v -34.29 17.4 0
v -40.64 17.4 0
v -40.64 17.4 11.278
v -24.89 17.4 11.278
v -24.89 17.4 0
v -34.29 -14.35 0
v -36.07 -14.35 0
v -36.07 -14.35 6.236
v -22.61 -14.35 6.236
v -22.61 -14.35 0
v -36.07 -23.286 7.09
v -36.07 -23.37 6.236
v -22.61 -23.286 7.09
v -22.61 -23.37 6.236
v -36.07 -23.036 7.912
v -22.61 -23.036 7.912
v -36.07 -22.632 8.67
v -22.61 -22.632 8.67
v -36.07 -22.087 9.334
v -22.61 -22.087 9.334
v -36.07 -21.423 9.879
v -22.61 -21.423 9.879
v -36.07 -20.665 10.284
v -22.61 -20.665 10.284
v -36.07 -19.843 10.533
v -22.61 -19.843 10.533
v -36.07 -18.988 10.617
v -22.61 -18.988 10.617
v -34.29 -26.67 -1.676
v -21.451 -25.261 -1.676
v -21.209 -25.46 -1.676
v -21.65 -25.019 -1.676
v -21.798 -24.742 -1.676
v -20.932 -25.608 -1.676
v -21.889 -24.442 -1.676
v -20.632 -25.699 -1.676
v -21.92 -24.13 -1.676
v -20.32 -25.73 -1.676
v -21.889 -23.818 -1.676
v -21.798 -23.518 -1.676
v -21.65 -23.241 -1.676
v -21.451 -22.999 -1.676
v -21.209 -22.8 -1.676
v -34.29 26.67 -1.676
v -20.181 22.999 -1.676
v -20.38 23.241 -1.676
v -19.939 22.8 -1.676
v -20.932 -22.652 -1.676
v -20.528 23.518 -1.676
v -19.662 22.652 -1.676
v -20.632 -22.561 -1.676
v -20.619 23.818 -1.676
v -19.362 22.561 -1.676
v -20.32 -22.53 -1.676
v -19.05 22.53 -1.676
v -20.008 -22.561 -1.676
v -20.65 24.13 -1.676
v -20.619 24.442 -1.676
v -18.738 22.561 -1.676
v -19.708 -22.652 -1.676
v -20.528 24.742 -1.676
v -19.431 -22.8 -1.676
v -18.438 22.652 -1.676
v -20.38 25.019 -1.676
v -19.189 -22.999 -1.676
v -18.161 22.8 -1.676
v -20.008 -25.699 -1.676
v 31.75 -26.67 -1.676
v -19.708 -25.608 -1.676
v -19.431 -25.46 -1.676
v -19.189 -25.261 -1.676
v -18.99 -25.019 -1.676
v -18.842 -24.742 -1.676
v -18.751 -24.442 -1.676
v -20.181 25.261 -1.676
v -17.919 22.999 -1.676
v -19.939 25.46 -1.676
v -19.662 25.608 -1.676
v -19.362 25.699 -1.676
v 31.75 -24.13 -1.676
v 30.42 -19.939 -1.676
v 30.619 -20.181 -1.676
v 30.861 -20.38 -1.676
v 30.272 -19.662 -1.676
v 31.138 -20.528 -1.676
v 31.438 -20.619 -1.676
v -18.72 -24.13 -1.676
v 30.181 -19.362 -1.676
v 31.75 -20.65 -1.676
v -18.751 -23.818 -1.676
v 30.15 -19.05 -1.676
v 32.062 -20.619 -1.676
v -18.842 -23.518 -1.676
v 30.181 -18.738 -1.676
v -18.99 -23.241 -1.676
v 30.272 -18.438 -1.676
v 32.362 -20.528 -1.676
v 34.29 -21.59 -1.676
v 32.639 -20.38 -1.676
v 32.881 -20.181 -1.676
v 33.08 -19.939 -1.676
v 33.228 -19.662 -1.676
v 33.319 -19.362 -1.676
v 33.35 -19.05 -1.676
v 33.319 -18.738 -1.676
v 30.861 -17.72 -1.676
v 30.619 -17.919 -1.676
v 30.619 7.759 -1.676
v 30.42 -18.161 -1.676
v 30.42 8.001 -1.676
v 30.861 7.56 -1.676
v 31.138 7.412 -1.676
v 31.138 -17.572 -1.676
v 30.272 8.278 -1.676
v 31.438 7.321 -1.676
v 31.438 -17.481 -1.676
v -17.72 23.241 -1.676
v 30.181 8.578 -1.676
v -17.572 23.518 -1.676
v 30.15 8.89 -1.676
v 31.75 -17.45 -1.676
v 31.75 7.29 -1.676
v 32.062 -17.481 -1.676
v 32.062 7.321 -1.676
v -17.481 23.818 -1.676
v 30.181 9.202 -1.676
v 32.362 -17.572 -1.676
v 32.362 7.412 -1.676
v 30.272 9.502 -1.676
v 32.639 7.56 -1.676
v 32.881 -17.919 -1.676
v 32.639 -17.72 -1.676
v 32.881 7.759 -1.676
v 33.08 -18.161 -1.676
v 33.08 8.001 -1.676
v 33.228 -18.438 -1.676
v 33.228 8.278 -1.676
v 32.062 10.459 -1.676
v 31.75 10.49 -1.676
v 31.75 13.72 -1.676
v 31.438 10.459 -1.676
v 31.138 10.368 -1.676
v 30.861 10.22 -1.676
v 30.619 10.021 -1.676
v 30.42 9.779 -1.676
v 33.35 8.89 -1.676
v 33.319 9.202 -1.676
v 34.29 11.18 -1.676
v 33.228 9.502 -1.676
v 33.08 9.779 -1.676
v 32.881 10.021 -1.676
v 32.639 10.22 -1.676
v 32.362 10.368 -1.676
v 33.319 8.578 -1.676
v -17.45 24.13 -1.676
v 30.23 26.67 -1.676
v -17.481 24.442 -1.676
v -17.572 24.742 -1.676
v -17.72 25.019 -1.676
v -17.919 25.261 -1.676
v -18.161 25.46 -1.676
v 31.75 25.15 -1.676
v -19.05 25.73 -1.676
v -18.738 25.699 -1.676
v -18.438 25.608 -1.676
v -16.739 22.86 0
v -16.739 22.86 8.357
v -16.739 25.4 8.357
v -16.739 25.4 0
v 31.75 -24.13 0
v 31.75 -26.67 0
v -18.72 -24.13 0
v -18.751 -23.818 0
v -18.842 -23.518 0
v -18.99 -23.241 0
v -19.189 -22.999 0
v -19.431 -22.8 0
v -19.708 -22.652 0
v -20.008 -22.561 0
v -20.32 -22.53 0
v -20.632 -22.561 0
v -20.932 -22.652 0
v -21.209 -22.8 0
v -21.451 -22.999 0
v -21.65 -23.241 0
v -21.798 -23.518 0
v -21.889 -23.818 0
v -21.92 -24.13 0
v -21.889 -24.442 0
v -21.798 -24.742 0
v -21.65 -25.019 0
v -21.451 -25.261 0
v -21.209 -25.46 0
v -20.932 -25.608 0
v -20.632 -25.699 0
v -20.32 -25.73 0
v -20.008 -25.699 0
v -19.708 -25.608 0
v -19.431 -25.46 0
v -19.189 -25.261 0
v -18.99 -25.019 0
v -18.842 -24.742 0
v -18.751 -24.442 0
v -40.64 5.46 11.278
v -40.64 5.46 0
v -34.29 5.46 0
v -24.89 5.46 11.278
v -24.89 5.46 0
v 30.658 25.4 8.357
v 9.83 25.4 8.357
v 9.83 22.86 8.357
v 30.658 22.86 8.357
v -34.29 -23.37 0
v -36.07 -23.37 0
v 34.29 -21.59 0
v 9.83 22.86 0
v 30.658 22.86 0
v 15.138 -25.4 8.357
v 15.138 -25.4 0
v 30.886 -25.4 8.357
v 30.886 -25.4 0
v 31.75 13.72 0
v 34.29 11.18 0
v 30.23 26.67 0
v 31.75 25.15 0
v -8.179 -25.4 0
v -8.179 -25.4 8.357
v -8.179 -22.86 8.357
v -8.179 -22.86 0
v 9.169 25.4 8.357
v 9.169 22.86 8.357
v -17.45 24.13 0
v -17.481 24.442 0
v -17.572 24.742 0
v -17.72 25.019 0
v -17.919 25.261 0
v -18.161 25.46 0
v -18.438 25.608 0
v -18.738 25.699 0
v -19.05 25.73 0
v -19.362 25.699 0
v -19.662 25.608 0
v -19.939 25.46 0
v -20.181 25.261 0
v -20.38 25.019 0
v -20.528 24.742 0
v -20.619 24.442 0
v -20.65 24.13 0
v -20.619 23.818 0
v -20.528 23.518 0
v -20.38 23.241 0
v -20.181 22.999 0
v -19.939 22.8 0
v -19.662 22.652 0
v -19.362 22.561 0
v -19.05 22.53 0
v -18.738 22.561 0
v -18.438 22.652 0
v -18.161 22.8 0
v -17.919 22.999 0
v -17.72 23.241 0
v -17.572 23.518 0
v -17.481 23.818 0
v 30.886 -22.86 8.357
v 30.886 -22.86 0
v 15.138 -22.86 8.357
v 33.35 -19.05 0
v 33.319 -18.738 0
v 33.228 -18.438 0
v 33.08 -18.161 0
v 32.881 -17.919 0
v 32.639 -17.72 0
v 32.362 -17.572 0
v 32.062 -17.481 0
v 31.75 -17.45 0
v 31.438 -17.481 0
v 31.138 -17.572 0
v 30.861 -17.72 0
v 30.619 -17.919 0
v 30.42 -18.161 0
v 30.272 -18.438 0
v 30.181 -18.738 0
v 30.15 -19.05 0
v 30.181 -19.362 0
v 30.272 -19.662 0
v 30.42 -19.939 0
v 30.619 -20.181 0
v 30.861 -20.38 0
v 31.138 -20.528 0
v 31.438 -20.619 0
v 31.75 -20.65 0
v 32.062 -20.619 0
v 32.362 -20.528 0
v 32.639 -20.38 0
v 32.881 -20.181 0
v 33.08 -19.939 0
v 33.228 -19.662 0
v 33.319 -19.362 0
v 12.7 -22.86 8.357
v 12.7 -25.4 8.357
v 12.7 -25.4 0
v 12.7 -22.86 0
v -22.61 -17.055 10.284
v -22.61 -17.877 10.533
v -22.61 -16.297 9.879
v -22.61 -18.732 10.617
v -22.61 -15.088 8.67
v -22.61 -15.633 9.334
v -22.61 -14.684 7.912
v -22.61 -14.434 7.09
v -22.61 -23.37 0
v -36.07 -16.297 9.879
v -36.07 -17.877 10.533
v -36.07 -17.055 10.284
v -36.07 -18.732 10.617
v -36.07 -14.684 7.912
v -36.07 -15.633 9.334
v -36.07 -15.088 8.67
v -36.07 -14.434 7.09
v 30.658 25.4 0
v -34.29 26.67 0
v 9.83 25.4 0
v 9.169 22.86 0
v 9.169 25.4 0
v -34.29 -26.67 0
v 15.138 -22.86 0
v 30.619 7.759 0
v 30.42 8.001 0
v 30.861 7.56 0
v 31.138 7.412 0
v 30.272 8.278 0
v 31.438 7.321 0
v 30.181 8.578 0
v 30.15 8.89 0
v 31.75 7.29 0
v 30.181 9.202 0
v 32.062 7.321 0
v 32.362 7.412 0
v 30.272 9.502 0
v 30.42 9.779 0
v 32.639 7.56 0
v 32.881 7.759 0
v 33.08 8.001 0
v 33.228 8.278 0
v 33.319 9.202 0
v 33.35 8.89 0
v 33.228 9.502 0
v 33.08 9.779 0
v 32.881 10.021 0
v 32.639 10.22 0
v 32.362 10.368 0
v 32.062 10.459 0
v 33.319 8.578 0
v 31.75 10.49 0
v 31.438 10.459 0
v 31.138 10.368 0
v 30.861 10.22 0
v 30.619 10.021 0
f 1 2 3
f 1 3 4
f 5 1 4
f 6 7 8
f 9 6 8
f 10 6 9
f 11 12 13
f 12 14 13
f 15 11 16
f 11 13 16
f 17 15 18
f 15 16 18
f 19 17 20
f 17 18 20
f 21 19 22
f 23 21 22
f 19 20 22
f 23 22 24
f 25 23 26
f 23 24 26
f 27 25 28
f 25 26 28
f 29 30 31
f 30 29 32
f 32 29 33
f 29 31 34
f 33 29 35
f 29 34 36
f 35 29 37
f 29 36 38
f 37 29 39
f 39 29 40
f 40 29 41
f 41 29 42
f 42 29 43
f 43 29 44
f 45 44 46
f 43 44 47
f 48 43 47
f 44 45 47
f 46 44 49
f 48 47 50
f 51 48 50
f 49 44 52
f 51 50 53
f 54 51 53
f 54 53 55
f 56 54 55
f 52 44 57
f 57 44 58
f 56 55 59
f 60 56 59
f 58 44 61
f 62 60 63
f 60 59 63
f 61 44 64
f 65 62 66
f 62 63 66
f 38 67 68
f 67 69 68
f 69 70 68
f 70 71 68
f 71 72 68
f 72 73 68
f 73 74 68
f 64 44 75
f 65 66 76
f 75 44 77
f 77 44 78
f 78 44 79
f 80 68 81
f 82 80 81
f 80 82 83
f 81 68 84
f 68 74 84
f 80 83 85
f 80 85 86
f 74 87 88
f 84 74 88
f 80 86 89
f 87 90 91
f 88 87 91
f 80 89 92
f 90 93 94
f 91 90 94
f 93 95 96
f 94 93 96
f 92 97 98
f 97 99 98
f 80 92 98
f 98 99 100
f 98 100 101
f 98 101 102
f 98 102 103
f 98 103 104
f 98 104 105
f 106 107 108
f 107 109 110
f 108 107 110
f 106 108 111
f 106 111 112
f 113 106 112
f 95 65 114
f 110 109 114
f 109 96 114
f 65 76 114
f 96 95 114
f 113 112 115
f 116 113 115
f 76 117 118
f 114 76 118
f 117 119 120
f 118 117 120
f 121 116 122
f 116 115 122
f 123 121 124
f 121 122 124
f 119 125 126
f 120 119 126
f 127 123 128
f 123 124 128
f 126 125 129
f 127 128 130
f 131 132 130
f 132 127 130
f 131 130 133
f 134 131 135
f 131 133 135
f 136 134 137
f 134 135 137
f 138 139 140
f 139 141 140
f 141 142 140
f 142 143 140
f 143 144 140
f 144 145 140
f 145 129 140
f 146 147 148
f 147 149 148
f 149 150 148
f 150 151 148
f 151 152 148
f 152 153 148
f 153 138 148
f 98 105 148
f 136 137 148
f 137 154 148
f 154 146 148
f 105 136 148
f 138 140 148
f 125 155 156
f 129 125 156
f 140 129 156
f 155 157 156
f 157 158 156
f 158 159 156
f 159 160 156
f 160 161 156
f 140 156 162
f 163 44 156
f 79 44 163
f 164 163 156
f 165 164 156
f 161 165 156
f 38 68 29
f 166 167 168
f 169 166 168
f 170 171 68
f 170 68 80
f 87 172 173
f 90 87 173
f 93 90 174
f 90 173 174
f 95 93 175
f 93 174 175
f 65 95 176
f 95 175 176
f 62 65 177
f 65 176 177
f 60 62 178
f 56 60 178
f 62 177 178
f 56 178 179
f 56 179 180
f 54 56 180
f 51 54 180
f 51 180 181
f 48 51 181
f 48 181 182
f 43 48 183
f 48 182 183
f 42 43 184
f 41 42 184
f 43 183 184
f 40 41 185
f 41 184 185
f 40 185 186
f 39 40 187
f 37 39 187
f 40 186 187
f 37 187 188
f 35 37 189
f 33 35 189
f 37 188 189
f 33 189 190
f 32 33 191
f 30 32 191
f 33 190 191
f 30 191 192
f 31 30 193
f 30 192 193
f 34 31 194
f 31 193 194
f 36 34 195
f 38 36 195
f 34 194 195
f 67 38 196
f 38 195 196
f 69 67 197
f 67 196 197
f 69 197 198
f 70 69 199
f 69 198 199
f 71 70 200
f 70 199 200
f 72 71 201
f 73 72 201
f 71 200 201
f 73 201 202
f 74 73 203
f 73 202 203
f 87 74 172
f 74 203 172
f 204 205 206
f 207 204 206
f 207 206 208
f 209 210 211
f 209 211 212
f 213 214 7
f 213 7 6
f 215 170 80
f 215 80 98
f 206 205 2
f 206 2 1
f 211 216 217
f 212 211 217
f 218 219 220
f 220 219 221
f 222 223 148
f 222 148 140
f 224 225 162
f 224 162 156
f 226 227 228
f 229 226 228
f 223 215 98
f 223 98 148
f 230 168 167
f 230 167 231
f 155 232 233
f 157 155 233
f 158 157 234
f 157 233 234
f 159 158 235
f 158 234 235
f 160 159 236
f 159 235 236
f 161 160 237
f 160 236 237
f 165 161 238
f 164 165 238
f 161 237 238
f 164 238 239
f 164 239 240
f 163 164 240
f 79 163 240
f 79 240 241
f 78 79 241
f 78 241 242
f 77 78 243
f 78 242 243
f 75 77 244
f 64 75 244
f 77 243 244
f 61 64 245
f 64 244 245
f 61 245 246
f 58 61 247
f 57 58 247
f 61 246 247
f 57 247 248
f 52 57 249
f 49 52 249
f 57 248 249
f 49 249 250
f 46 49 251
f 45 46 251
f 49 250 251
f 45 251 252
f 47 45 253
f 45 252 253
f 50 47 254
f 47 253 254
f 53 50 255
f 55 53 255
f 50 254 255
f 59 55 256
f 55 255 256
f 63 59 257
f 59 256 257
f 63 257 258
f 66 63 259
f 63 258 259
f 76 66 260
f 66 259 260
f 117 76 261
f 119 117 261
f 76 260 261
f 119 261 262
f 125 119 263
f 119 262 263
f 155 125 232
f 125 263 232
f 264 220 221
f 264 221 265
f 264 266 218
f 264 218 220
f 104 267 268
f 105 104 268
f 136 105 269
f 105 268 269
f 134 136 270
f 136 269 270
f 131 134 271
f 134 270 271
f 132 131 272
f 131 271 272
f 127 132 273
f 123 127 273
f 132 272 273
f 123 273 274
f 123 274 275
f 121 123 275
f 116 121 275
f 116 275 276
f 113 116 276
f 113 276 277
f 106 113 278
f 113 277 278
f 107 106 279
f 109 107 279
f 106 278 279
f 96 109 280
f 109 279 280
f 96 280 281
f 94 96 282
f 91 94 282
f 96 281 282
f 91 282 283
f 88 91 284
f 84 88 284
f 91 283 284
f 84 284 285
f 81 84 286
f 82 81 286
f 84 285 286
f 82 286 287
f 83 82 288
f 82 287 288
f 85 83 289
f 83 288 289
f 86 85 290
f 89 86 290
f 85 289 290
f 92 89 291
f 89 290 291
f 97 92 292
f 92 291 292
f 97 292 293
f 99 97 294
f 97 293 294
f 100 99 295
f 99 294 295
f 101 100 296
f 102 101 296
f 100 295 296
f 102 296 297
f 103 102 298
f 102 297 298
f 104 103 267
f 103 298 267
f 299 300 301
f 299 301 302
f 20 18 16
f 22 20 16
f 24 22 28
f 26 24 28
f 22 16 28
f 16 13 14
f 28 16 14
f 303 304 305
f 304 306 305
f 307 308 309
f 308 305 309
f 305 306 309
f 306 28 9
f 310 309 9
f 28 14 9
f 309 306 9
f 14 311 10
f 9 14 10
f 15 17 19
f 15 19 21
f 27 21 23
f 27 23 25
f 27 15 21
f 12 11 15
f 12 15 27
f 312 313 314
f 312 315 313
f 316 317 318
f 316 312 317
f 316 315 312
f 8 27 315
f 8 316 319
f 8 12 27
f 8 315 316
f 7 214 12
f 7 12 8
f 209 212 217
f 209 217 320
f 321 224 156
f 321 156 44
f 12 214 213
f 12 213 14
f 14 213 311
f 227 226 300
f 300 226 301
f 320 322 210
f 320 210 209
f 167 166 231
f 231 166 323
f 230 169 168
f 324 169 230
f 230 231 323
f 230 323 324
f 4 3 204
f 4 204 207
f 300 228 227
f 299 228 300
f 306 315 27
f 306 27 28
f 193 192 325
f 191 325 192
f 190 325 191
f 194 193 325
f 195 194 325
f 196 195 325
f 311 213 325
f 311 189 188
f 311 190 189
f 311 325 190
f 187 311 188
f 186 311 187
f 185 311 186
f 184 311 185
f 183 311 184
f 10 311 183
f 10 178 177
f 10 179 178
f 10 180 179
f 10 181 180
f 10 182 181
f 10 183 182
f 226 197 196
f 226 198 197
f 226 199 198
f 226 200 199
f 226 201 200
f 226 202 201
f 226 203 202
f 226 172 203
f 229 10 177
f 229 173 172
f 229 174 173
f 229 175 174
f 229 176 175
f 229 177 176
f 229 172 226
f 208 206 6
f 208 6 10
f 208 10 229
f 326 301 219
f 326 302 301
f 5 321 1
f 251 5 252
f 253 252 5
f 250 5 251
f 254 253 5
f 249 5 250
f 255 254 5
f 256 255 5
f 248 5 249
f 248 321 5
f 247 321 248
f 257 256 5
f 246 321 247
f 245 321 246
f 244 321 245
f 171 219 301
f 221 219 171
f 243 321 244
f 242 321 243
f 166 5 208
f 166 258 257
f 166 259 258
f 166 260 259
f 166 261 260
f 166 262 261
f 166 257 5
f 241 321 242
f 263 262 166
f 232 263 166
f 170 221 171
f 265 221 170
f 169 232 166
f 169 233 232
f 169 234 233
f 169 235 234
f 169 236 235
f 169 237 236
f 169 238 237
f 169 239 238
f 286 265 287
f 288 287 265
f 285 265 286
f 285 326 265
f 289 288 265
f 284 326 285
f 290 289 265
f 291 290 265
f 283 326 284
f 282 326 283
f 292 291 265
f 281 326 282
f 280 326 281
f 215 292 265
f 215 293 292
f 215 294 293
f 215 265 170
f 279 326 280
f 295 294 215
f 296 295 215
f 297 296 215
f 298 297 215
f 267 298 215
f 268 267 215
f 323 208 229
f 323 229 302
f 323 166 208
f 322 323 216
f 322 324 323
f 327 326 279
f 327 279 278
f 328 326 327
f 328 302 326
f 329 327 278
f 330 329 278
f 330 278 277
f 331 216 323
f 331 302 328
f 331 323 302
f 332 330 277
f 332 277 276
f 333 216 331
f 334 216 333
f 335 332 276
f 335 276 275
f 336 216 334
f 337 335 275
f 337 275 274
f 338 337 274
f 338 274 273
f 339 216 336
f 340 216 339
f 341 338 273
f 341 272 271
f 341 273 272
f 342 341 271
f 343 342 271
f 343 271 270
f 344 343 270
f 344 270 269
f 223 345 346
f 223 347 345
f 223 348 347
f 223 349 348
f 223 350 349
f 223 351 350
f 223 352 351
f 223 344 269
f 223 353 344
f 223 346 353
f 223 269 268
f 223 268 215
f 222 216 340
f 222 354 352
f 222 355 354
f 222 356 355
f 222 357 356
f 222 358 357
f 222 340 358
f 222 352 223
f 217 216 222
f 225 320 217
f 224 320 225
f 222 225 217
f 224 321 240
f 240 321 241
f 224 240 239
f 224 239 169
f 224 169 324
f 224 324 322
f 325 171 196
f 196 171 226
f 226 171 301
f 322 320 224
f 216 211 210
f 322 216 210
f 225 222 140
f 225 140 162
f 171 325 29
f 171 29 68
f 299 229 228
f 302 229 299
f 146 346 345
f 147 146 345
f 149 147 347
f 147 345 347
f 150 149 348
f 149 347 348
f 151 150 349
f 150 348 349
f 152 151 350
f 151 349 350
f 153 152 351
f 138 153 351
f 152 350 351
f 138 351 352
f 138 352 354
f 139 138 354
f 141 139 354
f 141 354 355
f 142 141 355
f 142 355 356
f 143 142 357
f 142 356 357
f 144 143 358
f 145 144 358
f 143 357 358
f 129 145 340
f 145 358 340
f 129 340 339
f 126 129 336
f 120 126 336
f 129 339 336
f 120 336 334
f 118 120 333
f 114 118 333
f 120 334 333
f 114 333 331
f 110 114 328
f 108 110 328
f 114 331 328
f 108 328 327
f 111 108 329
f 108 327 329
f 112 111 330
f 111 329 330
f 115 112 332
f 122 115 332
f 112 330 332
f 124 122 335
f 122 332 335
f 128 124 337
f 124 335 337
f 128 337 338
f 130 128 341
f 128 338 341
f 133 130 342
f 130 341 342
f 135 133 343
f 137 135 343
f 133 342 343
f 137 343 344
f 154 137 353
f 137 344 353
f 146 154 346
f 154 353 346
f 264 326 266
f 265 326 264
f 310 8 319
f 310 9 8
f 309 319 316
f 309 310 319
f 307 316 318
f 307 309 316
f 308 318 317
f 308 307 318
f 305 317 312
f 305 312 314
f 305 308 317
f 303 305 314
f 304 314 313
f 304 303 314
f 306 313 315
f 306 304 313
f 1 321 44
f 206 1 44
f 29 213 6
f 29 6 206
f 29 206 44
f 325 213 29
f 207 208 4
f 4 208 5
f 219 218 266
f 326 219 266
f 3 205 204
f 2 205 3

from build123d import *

# Parameters (mm, degrees)
F0_R     = 1.6
F2_DEPTH = 1.6764
F1_W     = 15.75
F1_H     = 11.94
F3_DEPTH = 11.2776
F1_W_2   = 13.46
F1_H_2   = 9.02
F4_DEPTH = 10.6172
F5_R     = 4.3815
F1_W_3   = 20.8788
F1_H_3   = 2.54
F1_W_4   = 15.748
F1_W_5   = 25.908
F1_W_6   = 20.828
F6_DEPTH = 8.3566


with BuildPart() as f2:
    # F0 (on Top) → F2 (new body)
    with BuildSketch(Plane.XY):
        Polygon((30.23, 26.67), (-34.29, 26.67), (-34.29, -26.67), (31.75, -26.67), (31.75, -24.13), (34.29, -21.59), (34.29, 11.18), (31.75, 13.72), (31.75, 25.15), align=None)
        with Locations((-20.32, -24.13)):
            Circle(F0_R, mode=Mode.SUBTRACT)
        with Locations((31.75, -19.05)):
            Circle(F0_R, mode=Mode.SUBTRACT)
        with Locations((-19.05, 24.13)):
            Circle(F0_R, mode=Mode.SUBTRACT)
        with Locations((31.75, 8.89)):
            Circle(F0_R, mode=Mode.SUBTRACT)
    extrude(amount=-F2_DEPTH)

    # F1 (on Top) → F3 (join)
    with BuildSketch(Plane.XY):
        with Locations((-32.765, 11.43)):
            Rectangle(F1_W, F1_H)
    extrude(amount=F3_DEPTH)

    # F1 (on Top) → F4 (join)
    with BuildSketch(Plane.XY):
        with Locations((-29.34, -18.86)):
            Rectangle(F1_W_2, F1_H_2)
    extrude(amount=F4_DEPTH)

    # F5
    f5_edges = [f2.edges().sort_by_distance(p)[0] for p in [
        (-29.34, -23.37, 10.6172),
        (-29.34, -14.35, 10.6172),
    ]]
    fillet(f5_edges, radius=F5_R)

    # F1 (on Top) → F6 (join)
    with BuildSketch(Plane.XY):
        with Locations((2.2606, -24.13)):
            Rectangle(F1_W_3, F1_H_3)
        with Locations((23.0124, -24.13)):
            Rectangle(F1_W_4, F1_H_3)
        with Locations((-3.7846, 24.13)):
            Rectangle(F1_W_5, F1_H_3)
        with Locations((20.2438, 24.13)):
            Rectangle(F1_W_6, F1_H_3)
    extrude(amount=F6_DEPTH)


solid = f2.part
